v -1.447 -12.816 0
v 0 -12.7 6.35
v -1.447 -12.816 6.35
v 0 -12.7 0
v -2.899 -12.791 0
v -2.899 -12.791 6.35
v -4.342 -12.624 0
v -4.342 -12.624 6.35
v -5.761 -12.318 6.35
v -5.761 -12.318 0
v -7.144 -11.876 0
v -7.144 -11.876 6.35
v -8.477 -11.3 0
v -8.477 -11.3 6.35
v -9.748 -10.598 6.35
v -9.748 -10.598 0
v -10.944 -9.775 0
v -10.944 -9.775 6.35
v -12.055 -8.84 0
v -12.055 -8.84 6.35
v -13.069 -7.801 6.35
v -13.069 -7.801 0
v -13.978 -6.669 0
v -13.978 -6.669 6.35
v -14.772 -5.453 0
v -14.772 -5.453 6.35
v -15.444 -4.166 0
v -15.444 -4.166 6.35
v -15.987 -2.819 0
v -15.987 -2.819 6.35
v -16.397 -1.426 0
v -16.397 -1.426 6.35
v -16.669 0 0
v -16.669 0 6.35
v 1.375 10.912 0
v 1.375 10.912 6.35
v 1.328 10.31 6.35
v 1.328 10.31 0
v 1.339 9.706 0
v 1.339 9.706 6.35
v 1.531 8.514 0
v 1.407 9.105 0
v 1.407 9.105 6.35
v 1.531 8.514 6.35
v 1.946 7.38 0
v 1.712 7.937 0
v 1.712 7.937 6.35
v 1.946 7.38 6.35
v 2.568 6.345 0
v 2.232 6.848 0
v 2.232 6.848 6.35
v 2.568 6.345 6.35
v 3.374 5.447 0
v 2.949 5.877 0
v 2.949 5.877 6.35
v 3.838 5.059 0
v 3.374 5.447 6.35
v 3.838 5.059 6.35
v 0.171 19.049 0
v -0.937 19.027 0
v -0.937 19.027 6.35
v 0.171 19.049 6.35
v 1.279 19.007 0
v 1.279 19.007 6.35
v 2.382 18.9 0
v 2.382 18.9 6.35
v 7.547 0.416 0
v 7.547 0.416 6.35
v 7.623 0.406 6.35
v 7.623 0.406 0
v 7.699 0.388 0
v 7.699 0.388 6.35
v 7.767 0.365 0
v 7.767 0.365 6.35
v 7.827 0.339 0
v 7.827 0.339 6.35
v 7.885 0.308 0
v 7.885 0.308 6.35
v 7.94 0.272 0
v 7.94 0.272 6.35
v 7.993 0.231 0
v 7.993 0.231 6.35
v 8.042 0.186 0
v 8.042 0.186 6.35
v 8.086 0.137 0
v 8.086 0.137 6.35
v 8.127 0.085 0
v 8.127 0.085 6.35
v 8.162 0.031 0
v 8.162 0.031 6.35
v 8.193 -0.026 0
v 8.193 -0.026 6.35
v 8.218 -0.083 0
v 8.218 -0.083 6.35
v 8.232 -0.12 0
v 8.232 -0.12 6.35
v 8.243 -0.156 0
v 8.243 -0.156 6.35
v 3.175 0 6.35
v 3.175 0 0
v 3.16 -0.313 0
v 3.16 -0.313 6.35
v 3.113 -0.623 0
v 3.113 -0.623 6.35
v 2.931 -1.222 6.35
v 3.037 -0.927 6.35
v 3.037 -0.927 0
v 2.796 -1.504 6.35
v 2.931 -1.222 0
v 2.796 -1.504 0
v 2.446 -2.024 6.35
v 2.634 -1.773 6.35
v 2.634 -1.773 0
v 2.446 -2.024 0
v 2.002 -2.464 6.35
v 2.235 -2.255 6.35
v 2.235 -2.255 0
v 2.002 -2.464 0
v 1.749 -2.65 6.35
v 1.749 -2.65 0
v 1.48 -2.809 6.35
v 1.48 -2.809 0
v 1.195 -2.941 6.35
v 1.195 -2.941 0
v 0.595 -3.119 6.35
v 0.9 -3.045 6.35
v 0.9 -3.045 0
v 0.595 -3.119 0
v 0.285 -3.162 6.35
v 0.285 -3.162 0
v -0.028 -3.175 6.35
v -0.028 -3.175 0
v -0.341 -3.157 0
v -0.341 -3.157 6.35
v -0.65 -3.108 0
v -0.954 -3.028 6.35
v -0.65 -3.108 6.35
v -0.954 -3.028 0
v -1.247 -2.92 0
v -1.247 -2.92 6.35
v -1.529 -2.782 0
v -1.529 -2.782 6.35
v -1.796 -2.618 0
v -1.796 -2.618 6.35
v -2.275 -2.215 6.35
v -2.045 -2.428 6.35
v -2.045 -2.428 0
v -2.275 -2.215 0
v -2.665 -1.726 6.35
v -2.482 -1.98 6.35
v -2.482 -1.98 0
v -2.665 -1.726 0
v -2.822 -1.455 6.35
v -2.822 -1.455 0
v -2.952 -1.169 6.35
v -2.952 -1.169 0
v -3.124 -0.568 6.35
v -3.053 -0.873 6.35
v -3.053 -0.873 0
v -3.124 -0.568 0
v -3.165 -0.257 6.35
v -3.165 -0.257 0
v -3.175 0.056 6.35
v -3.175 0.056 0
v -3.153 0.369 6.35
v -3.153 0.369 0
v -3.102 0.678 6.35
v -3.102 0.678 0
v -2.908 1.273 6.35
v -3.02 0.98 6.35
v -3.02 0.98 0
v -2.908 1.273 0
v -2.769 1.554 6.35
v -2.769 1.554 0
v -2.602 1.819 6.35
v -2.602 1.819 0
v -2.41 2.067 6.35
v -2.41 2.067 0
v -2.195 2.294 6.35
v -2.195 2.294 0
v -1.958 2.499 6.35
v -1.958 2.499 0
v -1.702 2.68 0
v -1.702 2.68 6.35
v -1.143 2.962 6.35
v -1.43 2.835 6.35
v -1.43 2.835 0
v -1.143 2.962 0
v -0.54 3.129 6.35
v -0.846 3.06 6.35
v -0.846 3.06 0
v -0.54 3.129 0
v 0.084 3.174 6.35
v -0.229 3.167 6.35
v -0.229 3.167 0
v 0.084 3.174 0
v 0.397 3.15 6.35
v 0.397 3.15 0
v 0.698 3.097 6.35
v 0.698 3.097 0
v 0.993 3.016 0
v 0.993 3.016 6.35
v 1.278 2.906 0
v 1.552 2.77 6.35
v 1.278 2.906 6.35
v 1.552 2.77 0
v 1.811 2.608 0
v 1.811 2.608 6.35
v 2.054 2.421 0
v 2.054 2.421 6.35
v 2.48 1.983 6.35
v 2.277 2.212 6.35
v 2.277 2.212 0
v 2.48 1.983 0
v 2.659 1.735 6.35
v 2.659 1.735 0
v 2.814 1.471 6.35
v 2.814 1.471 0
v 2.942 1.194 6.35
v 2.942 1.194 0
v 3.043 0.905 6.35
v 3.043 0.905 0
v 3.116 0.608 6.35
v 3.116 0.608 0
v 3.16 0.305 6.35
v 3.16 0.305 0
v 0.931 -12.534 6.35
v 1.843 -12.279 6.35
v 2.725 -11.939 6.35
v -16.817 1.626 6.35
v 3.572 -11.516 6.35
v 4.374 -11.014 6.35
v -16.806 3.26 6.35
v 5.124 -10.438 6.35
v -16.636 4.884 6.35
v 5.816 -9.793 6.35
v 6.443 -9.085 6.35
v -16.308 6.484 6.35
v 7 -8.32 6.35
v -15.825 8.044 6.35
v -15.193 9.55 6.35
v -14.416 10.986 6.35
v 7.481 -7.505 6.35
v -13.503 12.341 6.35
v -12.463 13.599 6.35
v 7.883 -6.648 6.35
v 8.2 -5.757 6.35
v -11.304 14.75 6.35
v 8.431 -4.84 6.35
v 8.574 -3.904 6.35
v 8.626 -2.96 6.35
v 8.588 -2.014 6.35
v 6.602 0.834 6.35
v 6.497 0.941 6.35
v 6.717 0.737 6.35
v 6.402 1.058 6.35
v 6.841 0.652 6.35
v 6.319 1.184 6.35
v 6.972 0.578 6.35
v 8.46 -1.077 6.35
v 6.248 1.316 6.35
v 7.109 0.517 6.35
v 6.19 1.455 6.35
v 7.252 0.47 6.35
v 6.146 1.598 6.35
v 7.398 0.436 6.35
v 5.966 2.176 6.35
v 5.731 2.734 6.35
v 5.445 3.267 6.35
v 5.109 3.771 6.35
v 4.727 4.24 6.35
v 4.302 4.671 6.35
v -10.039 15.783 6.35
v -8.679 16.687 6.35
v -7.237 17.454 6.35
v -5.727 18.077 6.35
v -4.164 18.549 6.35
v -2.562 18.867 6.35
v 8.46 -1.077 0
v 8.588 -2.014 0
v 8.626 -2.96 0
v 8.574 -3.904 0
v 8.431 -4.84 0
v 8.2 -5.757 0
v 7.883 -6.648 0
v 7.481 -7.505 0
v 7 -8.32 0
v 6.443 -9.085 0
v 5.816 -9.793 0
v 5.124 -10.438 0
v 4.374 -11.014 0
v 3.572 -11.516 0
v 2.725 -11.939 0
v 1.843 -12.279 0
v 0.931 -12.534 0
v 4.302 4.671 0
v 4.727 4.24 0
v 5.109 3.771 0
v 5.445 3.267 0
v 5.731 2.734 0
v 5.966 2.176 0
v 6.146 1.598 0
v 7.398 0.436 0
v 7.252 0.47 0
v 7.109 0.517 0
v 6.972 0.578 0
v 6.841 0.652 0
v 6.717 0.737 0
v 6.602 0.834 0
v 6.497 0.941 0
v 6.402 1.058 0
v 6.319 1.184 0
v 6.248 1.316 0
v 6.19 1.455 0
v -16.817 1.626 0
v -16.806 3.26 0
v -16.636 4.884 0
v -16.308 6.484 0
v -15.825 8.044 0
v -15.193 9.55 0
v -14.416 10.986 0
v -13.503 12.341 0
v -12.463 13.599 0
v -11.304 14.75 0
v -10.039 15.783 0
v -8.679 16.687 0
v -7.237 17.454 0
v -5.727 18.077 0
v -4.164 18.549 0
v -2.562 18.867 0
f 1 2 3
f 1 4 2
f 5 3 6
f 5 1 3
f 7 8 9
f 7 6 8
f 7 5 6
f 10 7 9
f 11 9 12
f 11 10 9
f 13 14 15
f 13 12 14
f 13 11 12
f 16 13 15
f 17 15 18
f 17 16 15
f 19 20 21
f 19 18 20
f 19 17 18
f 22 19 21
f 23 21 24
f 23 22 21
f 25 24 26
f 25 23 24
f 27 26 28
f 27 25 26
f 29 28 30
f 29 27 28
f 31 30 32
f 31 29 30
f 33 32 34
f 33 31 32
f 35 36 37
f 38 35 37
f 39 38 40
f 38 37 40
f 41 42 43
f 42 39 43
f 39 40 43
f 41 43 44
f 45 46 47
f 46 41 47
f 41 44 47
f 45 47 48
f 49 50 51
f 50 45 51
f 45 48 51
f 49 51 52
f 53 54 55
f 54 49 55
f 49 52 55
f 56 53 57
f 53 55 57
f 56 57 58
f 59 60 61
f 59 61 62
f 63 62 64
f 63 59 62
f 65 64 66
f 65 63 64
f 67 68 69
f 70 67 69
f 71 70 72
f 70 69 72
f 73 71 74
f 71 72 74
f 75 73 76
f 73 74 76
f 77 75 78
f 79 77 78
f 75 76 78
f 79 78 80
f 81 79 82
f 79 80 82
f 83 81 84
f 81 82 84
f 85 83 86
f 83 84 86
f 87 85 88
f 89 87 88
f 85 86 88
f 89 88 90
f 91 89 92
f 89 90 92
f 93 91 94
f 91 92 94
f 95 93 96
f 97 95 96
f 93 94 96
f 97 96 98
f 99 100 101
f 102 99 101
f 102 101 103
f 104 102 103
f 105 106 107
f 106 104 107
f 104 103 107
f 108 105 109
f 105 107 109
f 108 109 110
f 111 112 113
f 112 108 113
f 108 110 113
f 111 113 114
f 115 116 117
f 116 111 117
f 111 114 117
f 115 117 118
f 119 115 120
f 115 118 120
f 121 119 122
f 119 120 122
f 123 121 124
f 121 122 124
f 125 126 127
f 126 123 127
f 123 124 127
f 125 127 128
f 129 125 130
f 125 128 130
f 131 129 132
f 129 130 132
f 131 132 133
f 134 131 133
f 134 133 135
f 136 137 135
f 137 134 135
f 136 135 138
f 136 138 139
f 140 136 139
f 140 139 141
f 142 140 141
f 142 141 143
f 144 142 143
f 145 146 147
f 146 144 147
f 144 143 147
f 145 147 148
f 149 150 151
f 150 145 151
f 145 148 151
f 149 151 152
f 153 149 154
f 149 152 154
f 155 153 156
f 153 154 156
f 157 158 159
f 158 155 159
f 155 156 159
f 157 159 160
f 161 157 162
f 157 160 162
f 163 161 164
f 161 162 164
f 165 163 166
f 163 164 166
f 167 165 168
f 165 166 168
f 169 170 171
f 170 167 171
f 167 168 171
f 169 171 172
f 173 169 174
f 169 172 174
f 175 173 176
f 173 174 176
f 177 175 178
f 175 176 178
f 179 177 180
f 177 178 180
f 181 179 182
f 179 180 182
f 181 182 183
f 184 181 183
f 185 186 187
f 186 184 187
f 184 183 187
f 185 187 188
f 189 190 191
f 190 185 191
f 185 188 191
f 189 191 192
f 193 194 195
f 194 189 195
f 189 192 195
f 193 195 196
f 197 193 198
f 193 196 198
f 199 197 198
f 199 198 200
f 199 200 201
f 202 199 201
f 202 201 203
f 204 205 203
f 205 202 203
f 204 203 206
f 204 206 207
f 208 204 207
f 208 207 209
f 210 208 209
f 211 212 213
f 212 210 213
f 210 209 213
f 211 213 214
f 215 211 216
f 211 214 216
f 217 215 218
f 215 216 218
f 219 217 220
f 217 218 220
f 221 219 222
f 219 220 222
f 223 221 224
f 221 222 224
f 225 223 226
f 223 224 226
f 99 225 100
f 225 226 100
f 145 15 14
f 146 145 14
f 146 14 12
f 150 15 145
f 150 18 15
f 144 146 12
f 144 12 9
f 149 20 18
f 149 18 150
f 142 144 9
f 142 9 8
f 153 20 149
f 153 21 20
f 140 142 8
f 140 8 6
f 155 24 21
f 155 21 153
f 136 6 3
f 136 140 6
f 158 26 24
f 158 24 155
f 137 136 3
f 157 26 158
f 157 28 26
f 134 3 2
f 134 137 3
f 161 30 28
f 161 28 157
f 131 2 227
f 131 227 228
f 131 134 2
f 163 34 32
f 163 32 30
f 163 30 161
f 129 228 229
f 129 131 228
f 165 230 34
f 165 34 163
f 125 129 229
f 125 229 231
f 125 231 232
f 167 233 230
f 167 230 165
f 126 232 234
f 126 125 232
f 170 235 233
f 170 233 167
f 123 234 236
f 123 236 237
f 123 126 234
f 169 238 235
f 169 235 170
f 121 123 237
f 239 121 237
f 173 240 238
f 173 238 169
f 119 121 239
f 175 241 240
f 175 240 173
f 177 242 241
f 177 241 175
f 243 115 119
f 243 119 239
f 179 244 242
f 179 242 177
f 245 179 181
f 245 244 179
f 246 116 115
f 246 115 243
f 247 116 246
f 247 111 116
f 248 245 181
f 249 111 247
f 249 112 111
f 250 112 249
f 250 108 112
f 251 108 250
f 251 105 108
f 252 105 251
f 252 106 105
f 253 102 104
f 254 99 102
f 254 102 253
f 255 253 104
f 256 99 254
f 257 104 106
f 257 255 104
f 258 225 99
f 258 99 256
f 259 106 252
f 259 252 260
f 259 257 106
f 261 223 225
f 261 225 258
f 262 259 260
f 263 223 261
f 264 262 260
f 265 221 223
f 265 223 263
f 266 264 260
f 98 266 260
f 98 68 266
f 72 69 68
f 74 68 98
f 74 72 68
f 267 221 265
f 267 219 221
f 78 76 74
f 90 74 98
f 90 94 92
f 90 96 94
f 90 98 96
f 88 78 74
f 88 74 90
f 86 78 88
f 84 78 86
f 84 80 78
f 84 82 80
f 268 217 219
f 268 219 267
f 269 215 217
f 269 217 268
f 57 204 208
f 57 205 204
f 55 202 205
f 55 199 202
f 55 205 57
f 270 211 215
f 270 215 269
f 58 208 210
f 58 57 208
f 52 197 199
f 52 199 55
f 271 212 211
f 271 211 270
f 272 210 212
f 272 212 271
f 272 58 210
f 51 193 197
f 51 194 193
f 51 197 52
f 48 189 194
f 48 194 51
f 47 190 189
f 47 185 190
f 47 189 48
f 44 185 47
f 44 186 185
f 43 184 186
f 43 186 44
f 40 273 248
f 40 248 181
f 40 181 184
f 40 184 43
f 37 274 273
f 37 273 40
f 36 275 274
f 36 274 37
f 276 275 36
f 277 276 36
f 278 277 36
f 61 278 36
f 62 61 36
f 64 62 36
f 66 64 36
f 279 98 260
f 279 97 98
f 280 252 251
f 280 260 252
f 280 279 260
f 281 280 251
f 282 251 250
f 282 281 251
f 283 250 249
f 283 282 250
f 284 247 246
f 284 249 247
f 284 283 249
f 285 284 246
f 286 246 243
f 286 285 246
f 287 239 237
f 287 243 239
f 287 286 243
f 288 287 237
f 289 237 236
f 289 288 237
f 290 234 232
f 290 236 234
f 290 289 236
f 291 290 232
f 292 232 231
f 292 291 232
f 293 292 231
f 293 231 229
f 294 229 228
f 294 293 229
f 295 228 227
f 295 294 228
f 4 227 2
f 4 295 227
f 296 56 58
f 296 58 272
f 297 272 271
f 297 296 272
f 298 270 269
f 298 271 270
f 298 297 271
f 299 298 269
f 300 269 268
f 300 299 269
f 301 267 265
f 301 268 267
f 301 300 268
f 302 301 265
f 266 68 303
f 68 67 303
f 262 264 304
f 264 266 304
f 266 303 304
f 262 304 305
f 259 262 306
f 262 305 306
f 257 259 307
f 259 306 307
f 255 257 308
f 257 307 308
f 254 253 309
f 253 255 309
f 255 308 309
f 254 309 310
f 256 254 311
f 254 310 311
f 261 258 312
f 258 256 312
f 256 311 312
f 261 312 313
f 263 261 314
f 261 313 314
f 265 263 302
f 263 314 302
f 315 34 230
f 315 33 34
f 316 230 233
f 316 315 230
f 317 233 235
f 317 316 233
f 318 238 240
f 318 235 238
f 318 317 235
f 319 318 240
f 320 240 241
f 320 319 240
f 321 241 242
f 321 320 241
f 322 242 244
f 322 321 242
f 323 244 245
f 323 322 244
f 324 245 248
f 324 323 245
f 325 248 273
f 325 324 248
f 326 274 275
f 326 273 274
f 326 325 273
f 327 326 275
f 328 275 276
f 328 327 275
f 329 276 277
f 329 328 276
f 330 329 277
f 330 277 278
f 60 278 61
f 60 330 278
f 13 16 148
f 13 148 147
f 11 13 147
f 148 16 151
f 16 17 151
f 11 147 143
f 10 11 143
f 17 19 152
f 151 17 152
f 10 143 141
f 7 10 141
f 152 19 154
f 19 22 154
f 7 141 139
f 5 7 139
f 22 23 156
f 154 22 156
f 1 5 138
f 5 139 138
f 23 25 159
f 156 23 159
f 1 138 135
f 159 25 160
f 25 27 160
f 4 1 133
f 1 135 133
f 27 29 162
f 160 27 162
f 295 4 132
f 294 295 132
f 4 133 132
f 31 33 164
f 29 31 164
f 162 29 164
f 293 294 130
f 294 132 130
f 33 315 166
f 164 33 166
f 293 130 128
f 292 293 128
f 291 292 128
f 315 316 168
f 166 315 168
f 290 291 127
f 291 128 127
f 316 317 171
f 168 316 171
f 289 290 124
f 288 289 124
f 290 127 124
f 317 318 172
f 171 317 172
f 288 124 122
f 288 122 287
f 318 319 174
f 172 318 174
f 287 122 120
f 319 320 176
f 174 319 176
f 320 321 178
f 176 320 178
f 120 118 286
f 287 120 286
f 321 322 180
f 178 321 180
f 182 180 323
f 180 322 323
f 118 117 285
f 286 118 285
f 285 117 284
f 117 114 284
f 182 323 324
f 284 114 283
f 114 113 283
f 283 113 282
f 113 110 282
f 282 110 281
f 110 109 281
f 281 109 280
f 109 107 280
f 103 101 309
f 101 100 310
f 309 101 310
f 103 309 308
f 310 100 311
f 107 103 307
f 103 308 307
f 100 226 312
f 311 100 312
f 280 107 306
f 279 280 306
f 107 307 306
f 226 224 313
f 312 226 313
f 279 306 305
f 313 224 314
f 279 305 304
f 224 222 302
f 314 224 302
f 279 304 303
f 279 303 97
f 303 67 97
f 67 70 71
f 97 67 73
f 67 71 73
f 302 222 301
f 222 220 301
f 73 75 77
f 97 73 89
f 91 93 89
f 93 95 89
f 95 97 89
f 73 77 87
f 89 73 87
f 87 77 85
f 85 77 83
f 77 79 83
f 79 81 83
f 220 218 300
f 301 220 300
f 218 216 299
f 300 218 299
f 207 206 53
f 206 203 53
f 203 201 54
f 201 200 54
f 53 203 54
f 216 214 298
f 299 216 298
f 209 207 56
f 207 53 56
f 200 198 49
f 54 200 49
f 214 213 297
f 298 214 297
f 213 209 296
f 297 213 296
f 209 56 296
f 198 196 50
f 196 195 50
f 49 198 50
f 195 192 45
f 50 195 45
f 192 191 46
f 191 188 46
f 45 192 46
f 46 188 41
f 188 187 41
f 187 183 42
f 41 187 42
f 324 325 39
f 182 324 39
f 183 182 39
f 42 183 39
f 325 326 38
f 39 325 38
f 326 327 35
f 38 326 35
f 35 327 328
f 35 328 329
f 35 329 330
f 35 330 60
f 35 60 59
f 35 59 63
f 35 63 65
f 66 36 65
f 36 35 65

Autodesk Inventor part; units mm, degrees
ref_plane "YZ Plane" through (0, 0, 0) normal (1, 0, 0) x (0, 1, 0)
ref_plane "XZ Plane" through (0, 0, 0) normal (0, 1, 0) x (-1, 0, 0)
ref_plane "XY Plane" through (0, 0, 0) normal (0, 0, 1) x (1, 0, 0)
sketch "Sketch1" plane through (0, 0, 0) normal (0, 0, 1) x (1, 0, 0)
  circle A0 centre (0, 0) radius 3.175
  circle A1 centre (0, 0) radius 19.05
  circle A2 centre (40.4812, 19.05) radius 38.1 construction
  line L0 (2.3815, 18.9005) -> (40.4812, 19.05) construction
  circle A3 centre (0, 0) radius 6.35
  circle A4 centre (0, 0) radius 7.9375 construction
  line L1 (0, 0) -> (2.3815, 18.9005)
  line L2 (0, 0) -> (-0.9367, 19.027) construction
  line L3 (40.4812, 19.05) -> (6.35, 0) construction
  line L4 (0, 0) -> (7.9375, 0) construction
  circle A5 centre (0, 0) radius 12.7 construction
  circle A6 centre (0, 0) radius 16.6688 construction
  arc A7 (0, -12.7) -> (7.8908, 0.86) centre (-1.2714, -2.8843) ccw
  line L5 (0, 0) -> (0, -12.7) construction
  line L6 (0, 0) -> (-19.05, 0) construction
  arc A8 (-16.6688, 0) -> (0, -12.7) centre (-1.914, 2.0767) ccw
  arc A9 (-0.9367, 19.027) -> (-16.6688, 0) centre (-0.1147, 2.33) ccw
  circle A10 centre (7.682, 1.9978) radius 1.5875
  line L7 (7.8908, 0.86) -> (9.2192, 1.6014)
  point P0 (0.7938, 6.3002)
  point P1 (7.2124, 0.4813)
  point P2 (6.1456, 1.5983)
  point P3 (8.0468, 0.4528)
  dimension "d5" = 12.7
  dimension "d15" = 25.4
  dimension "d16" = 33.3375
  dimension "d0" = 6.35
  dimension "d1" = 38.1
  dimension "d2" = 76.2
  dimension "d6" = 15.875
  dimension "d11" = 19.05
  dimension "d12" = 40.4813
  dimension "d13" = 10
  dimension "d14" = 28.943
  dimension "d20" = 3.175
extrude "Extrusion1" add sketch "Sketch1" along normal blind 6.35 contours A3 | A3 A10 A7 A8 A9 A1 L1 picked at (-2.1715, 14.5665)
fillet "Fillet1" radius 6.35 1 edges at (0.7938, 6.3002, 3.175)
fillet "Fillet3" radius 0.7937 1 edges at (8.0468, 0.4528, 3.175)
properties part number "Snail V2" material "UHMW, White"
